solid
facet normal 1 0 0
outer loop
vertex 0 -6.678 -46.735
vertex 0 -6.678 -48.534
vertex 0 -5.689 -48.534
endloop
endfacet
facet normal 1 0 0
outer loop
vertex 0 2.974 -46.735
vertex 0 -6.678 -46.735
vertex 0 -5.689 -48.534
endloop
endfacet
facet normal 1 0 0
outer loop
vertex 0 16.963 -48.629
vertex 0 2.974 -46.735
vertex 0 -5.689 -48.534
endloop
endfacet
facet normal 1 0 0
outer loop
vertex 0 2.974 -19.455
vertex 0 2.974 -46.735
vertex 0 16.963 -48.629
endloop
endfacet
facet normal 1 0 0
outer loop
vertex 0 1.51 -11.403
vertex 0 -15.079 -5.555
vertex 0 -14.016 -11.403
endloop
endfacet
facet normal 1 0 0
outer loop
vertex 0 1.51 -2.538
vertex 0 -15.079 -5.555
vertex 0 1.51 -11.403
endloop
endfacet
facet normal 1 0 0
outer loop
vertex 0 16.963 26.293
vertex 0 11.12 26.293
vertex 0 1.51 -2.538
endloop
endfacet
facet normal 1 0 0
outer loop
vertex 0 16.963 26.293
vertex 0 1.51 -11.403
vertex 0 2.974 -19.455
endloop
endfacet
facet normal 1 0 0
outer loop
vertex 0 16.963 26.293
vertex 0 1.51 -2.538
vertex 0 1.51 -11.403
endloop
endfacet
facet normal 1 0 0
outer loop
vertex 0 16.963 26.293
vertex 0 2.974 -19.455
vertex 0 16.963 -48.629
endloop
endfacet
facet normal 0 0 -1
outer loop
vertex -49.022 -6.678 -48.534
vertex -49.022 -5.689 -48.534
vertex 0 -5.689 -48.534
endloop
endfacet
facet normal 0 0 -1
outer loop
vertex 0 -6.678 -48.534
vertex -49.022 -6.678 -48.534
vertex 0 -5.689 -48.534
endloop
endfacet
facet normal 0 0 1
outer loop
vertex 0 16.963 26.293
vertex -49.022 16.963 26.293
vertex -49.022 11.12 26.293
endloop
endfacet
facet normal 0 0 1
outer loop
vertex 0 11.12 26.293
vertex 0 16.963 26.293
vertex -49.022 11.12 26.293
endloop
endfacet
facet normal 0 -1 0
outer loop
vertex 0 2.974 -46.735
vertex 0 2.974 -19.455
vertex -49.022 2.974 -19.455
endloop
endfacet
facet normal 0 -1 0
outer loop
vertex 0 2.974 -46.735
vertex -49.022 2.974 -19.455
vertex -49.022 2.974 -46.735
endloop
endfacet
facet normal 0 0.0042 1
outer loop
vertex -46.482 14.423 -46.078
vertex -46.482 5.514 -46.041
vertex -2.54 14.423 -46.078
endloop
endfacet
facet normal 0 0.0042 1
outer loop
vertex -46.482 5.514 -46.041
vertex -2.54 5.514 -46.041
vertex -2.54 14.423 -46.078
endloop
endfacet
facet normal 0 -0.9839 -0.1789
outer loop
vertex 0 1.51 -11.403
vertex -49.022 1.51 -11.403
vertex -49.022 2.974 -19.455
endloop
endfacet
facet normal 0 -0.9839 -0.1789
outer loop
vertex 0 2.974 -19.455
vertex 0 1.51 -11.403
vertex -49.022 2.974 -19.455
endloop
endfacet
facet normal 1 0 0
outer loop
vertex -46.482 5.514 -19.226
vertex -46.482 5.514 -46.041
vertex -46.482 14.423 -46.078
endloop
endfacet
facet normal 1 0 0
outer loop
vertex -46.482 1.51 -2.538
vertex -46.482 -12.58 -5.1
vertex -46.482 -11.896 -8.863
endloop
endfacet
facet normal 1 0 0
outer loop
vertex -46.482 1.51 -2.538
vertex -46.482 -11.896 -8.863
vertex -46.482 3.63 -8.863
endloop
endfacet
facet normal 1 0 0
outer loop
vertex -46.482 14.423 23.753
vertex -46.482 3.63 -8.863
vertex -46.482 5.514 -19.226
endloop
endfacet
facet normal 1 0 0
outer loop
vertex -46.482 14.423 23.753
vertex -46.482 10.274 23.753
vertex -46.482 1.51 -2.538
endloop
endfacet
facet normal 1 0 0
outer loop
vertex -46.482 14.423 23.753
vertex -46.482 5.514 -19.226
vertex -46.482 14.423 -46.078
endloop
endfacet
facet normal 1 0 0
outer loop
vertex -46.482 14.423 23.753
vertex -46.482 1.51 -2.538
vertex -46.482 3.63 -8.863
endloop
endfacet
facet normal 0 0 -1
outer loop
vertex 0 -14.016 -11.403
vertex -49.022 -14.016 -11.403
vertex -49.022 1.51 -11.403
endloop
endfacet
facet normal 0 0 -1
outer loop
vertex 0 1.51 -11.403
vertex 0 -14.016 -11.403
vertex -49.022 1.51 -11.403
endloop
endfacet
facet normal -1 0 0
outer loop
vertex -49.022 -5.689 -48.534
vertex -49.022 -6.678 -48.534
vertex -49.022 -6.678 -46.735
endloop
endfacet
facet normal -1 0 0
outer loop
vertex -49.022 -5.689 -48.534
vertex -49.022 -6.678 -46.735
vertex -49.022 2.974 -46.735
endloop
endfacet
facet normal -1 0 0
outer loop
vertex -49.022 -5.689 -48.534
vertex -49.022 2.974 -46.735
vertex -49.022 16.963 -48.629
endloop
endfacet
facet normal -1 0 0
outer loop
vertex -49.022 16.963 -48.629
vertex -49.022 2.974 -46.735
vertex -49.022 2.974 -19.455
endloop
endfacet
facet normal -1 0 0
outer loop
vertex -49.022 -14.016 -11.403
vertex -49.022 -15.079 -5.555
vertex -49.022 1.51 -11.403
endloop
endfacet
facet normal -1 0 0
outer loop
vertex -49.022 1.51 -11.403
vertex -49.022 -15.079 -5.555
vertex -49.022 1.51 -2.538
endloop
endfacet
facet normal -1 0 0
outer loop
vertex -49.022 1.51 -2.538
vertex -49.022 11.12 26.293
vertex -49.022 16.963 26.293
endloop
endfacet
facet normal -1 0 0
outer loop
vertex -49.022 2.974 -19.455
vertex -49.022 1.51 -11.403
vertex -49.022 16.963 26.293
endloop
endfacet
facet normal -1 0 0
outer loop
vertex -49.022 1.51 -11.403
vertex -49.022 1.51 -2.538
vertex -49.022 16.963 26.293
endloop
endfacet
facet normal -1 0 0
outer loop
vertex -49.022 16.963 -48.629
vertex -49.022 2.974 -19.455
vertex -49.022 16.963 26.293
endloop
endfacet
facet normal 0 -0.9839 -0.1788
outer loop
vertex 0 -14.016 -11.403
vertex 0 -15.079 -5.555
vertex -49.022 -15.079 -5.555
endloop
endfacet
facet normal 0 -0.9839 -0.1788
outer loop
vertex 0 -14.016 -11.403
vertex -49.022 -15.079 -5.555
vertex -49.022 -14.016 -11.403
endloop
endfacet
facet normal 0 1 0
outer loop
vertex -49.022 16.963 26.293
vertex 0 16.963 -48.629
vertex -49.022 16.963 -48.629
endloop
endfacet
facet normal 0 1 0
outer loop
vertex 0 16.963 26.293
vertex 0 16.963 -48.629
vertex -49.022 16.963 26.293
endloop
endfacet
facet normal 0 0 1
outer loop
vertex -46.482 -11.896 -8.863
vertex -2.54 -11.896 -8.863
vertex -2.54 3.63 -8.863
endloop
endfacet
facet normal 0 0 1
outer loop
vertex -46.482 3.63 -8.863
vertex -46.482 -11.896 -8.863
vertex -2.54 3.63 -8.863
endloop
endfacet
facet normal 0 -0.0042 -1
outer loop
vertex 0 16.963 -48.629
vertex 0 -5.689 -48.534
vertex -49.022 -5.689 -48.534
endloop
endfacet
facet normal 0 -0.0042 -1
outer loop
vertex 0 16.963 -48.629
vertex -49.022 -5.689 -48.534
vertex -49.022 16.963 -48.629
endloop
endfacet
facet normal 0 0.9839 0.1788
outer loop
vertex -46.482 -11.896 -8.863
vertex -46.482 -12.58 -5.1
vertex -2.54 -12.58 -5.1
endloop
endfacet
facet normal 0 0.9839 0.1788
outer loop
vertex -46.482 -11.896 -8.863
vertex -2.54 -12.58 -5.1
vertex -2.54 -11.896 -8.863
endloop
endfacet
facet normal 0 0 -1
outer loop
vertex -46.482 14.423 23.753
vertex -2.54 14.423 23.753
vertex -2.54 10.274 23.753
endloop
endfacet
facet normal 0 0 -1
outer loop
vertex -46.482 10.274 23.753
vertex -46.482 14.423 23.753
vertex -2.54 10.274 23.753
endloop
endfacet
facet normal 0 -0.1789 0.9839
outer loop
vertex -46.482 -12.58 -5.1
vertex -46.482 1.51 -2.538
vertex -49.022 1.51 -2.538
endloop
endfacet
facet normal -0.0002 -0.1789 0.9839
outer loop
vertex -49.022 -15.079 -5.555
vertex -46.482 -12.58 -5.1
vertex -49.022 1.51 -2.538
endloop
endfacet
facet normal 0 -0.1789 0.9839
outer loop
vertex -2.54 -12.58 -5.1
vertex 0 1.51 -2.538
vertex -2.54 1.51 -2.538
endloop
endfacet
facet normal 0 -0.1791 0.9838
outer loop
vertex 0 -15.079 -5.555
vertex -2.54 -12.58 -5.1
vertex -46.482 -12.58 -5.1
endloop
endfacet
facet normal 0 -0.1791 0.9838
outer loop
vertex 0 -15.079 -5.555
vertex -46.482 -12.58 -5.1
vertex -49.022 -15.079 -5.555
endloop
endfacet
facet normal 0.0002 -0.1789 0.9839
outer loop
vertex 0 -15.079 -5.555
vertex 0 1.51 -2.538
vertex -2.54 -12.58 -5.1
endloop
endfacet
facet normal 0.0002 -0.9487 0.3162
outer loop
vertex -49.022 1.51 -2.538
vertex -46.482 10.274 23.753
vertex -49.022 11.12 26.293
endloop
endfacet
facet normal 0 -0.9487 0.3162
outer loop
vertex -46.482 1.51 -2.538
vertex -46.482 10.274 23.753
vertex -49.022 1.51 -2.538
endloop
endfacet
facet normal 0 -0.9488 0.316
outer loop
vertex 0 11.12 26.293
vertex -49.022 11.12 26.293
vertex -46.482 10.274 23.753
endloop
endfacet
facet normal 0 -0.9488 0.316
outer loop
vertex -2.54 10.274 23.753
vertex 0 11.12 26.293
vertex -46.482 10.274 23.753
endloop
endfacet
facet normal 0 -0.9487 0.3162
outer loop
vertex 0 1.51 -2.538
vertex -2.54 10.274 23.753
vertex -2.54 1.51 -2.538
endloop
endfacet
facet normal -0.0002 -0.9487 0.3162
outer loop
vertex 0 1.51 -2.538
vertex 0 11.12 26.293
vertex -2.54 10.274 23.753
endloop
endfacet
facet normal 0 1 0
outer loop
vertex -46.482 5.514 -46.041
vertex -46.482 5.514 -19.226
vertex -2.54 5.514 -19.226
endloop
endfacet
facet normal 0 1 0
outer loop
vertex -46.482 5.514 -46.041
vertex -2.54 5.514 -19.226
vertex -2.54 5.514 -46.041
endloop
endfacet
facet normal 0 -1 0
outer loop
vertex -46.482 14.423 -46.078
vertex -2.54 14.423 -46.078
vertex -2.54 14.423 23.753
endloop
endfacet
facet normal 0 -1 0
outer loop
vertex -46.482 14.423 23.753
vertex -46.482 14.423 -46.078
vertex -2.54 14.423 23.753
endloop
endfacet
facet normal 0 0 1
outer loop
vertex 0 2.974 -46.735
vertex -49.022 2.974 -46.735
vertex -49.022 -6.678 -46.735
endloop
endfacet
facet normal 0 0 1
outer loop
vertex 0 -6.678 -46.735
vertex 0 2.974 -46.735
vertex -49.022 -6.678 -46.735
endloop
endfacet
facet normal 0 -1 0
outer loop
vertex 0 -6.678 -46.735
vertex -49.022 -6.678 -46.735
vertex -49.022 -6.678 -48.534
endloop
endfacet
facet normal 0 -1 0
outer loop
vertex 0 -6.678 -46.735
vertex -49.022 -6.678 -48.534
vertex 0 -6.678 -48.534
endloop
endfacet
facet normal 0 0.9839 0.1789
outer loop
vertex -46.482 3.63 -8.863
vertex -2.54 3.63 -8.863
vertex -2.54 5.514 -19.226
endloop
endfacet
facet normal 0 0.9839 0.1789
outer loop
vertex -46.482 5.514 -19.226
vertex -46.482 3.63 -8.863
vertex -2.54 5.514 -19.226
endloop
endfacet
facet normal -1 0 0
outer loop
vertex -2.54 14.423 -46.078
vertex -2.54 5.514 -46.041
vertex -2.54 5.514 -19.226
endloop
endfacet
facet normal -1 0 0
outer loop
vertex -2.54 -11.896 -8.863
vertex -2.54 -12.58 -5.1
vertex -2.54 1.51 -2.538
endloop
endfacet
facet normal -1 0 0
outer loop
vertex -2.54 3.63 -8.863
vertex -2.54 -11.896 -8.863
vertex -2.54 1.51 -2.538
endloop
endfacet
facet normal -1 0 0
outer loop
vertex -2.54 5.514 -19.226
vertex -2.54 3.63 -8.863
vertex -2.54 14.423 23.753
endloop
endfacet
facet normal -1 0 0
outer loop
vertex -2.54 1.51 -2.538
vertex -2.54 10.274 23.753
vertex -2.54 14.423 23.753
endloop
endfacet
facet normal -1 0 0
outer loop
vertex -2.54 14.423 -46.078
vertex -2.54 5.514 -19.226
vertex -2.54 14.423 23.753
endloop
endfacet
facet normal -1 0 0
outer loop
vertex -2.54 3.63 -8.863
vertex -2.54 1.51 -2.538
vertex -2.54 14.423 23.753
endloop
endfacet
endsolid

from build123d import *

# Parameters (mm, degrees)
F1_DEPTH = 49.022
F2_T     = -2.54
F4_W     = 49.022
F4_H     = 1.7985738814
F5_DEPTH = 9.652


with BuildPart() as f1:
    # F0 (on Right) → F1 (new body)
    with BuildSketch(Plane.YZ):
        Polygon((1.5098481488, -2.5384752646), (-15.0794390421, -5.5547094899), (-14.0161000537, -11.4030735567), (1.5098481488, -11.4030735567), (2.9737947043, -19.4547791034), (2.9737947043, -46.7351712286), (-5.6977379136, -46.7351712286), (-5.6886866642, -48.53374511), (16.9632527977, -48.6290739331), (16.9632527977, 26.2930374593), (11.1203547567, 26.2930374593), align=None)
    extrude(amount=-F1_DEPTH)

    # F2
    f2_openings = [f1.faces().sort_by_distance(p)[0] for p in [
        (-24.511, 6.315101, 11.877281),
        (-24.511, -6.784795, -4.046592),
    ]]
    offset(amount=F2_T, openings=f2_openings, kind=Kind.INTERSECTION)

    # F4 (on face) → F5 (join)
    with BuildSketch(Plane.XZ.offset(-2.9737947043)):
        with Locations((-24.511, -47.6344581693)):
            Rectangle(F4_W, F4_H)
    extrude(amount=F5_DEPTH)


with BuildPart() as f8_1:
    # F8: copy of F1
    add(f1.part)


solid = f1.part
